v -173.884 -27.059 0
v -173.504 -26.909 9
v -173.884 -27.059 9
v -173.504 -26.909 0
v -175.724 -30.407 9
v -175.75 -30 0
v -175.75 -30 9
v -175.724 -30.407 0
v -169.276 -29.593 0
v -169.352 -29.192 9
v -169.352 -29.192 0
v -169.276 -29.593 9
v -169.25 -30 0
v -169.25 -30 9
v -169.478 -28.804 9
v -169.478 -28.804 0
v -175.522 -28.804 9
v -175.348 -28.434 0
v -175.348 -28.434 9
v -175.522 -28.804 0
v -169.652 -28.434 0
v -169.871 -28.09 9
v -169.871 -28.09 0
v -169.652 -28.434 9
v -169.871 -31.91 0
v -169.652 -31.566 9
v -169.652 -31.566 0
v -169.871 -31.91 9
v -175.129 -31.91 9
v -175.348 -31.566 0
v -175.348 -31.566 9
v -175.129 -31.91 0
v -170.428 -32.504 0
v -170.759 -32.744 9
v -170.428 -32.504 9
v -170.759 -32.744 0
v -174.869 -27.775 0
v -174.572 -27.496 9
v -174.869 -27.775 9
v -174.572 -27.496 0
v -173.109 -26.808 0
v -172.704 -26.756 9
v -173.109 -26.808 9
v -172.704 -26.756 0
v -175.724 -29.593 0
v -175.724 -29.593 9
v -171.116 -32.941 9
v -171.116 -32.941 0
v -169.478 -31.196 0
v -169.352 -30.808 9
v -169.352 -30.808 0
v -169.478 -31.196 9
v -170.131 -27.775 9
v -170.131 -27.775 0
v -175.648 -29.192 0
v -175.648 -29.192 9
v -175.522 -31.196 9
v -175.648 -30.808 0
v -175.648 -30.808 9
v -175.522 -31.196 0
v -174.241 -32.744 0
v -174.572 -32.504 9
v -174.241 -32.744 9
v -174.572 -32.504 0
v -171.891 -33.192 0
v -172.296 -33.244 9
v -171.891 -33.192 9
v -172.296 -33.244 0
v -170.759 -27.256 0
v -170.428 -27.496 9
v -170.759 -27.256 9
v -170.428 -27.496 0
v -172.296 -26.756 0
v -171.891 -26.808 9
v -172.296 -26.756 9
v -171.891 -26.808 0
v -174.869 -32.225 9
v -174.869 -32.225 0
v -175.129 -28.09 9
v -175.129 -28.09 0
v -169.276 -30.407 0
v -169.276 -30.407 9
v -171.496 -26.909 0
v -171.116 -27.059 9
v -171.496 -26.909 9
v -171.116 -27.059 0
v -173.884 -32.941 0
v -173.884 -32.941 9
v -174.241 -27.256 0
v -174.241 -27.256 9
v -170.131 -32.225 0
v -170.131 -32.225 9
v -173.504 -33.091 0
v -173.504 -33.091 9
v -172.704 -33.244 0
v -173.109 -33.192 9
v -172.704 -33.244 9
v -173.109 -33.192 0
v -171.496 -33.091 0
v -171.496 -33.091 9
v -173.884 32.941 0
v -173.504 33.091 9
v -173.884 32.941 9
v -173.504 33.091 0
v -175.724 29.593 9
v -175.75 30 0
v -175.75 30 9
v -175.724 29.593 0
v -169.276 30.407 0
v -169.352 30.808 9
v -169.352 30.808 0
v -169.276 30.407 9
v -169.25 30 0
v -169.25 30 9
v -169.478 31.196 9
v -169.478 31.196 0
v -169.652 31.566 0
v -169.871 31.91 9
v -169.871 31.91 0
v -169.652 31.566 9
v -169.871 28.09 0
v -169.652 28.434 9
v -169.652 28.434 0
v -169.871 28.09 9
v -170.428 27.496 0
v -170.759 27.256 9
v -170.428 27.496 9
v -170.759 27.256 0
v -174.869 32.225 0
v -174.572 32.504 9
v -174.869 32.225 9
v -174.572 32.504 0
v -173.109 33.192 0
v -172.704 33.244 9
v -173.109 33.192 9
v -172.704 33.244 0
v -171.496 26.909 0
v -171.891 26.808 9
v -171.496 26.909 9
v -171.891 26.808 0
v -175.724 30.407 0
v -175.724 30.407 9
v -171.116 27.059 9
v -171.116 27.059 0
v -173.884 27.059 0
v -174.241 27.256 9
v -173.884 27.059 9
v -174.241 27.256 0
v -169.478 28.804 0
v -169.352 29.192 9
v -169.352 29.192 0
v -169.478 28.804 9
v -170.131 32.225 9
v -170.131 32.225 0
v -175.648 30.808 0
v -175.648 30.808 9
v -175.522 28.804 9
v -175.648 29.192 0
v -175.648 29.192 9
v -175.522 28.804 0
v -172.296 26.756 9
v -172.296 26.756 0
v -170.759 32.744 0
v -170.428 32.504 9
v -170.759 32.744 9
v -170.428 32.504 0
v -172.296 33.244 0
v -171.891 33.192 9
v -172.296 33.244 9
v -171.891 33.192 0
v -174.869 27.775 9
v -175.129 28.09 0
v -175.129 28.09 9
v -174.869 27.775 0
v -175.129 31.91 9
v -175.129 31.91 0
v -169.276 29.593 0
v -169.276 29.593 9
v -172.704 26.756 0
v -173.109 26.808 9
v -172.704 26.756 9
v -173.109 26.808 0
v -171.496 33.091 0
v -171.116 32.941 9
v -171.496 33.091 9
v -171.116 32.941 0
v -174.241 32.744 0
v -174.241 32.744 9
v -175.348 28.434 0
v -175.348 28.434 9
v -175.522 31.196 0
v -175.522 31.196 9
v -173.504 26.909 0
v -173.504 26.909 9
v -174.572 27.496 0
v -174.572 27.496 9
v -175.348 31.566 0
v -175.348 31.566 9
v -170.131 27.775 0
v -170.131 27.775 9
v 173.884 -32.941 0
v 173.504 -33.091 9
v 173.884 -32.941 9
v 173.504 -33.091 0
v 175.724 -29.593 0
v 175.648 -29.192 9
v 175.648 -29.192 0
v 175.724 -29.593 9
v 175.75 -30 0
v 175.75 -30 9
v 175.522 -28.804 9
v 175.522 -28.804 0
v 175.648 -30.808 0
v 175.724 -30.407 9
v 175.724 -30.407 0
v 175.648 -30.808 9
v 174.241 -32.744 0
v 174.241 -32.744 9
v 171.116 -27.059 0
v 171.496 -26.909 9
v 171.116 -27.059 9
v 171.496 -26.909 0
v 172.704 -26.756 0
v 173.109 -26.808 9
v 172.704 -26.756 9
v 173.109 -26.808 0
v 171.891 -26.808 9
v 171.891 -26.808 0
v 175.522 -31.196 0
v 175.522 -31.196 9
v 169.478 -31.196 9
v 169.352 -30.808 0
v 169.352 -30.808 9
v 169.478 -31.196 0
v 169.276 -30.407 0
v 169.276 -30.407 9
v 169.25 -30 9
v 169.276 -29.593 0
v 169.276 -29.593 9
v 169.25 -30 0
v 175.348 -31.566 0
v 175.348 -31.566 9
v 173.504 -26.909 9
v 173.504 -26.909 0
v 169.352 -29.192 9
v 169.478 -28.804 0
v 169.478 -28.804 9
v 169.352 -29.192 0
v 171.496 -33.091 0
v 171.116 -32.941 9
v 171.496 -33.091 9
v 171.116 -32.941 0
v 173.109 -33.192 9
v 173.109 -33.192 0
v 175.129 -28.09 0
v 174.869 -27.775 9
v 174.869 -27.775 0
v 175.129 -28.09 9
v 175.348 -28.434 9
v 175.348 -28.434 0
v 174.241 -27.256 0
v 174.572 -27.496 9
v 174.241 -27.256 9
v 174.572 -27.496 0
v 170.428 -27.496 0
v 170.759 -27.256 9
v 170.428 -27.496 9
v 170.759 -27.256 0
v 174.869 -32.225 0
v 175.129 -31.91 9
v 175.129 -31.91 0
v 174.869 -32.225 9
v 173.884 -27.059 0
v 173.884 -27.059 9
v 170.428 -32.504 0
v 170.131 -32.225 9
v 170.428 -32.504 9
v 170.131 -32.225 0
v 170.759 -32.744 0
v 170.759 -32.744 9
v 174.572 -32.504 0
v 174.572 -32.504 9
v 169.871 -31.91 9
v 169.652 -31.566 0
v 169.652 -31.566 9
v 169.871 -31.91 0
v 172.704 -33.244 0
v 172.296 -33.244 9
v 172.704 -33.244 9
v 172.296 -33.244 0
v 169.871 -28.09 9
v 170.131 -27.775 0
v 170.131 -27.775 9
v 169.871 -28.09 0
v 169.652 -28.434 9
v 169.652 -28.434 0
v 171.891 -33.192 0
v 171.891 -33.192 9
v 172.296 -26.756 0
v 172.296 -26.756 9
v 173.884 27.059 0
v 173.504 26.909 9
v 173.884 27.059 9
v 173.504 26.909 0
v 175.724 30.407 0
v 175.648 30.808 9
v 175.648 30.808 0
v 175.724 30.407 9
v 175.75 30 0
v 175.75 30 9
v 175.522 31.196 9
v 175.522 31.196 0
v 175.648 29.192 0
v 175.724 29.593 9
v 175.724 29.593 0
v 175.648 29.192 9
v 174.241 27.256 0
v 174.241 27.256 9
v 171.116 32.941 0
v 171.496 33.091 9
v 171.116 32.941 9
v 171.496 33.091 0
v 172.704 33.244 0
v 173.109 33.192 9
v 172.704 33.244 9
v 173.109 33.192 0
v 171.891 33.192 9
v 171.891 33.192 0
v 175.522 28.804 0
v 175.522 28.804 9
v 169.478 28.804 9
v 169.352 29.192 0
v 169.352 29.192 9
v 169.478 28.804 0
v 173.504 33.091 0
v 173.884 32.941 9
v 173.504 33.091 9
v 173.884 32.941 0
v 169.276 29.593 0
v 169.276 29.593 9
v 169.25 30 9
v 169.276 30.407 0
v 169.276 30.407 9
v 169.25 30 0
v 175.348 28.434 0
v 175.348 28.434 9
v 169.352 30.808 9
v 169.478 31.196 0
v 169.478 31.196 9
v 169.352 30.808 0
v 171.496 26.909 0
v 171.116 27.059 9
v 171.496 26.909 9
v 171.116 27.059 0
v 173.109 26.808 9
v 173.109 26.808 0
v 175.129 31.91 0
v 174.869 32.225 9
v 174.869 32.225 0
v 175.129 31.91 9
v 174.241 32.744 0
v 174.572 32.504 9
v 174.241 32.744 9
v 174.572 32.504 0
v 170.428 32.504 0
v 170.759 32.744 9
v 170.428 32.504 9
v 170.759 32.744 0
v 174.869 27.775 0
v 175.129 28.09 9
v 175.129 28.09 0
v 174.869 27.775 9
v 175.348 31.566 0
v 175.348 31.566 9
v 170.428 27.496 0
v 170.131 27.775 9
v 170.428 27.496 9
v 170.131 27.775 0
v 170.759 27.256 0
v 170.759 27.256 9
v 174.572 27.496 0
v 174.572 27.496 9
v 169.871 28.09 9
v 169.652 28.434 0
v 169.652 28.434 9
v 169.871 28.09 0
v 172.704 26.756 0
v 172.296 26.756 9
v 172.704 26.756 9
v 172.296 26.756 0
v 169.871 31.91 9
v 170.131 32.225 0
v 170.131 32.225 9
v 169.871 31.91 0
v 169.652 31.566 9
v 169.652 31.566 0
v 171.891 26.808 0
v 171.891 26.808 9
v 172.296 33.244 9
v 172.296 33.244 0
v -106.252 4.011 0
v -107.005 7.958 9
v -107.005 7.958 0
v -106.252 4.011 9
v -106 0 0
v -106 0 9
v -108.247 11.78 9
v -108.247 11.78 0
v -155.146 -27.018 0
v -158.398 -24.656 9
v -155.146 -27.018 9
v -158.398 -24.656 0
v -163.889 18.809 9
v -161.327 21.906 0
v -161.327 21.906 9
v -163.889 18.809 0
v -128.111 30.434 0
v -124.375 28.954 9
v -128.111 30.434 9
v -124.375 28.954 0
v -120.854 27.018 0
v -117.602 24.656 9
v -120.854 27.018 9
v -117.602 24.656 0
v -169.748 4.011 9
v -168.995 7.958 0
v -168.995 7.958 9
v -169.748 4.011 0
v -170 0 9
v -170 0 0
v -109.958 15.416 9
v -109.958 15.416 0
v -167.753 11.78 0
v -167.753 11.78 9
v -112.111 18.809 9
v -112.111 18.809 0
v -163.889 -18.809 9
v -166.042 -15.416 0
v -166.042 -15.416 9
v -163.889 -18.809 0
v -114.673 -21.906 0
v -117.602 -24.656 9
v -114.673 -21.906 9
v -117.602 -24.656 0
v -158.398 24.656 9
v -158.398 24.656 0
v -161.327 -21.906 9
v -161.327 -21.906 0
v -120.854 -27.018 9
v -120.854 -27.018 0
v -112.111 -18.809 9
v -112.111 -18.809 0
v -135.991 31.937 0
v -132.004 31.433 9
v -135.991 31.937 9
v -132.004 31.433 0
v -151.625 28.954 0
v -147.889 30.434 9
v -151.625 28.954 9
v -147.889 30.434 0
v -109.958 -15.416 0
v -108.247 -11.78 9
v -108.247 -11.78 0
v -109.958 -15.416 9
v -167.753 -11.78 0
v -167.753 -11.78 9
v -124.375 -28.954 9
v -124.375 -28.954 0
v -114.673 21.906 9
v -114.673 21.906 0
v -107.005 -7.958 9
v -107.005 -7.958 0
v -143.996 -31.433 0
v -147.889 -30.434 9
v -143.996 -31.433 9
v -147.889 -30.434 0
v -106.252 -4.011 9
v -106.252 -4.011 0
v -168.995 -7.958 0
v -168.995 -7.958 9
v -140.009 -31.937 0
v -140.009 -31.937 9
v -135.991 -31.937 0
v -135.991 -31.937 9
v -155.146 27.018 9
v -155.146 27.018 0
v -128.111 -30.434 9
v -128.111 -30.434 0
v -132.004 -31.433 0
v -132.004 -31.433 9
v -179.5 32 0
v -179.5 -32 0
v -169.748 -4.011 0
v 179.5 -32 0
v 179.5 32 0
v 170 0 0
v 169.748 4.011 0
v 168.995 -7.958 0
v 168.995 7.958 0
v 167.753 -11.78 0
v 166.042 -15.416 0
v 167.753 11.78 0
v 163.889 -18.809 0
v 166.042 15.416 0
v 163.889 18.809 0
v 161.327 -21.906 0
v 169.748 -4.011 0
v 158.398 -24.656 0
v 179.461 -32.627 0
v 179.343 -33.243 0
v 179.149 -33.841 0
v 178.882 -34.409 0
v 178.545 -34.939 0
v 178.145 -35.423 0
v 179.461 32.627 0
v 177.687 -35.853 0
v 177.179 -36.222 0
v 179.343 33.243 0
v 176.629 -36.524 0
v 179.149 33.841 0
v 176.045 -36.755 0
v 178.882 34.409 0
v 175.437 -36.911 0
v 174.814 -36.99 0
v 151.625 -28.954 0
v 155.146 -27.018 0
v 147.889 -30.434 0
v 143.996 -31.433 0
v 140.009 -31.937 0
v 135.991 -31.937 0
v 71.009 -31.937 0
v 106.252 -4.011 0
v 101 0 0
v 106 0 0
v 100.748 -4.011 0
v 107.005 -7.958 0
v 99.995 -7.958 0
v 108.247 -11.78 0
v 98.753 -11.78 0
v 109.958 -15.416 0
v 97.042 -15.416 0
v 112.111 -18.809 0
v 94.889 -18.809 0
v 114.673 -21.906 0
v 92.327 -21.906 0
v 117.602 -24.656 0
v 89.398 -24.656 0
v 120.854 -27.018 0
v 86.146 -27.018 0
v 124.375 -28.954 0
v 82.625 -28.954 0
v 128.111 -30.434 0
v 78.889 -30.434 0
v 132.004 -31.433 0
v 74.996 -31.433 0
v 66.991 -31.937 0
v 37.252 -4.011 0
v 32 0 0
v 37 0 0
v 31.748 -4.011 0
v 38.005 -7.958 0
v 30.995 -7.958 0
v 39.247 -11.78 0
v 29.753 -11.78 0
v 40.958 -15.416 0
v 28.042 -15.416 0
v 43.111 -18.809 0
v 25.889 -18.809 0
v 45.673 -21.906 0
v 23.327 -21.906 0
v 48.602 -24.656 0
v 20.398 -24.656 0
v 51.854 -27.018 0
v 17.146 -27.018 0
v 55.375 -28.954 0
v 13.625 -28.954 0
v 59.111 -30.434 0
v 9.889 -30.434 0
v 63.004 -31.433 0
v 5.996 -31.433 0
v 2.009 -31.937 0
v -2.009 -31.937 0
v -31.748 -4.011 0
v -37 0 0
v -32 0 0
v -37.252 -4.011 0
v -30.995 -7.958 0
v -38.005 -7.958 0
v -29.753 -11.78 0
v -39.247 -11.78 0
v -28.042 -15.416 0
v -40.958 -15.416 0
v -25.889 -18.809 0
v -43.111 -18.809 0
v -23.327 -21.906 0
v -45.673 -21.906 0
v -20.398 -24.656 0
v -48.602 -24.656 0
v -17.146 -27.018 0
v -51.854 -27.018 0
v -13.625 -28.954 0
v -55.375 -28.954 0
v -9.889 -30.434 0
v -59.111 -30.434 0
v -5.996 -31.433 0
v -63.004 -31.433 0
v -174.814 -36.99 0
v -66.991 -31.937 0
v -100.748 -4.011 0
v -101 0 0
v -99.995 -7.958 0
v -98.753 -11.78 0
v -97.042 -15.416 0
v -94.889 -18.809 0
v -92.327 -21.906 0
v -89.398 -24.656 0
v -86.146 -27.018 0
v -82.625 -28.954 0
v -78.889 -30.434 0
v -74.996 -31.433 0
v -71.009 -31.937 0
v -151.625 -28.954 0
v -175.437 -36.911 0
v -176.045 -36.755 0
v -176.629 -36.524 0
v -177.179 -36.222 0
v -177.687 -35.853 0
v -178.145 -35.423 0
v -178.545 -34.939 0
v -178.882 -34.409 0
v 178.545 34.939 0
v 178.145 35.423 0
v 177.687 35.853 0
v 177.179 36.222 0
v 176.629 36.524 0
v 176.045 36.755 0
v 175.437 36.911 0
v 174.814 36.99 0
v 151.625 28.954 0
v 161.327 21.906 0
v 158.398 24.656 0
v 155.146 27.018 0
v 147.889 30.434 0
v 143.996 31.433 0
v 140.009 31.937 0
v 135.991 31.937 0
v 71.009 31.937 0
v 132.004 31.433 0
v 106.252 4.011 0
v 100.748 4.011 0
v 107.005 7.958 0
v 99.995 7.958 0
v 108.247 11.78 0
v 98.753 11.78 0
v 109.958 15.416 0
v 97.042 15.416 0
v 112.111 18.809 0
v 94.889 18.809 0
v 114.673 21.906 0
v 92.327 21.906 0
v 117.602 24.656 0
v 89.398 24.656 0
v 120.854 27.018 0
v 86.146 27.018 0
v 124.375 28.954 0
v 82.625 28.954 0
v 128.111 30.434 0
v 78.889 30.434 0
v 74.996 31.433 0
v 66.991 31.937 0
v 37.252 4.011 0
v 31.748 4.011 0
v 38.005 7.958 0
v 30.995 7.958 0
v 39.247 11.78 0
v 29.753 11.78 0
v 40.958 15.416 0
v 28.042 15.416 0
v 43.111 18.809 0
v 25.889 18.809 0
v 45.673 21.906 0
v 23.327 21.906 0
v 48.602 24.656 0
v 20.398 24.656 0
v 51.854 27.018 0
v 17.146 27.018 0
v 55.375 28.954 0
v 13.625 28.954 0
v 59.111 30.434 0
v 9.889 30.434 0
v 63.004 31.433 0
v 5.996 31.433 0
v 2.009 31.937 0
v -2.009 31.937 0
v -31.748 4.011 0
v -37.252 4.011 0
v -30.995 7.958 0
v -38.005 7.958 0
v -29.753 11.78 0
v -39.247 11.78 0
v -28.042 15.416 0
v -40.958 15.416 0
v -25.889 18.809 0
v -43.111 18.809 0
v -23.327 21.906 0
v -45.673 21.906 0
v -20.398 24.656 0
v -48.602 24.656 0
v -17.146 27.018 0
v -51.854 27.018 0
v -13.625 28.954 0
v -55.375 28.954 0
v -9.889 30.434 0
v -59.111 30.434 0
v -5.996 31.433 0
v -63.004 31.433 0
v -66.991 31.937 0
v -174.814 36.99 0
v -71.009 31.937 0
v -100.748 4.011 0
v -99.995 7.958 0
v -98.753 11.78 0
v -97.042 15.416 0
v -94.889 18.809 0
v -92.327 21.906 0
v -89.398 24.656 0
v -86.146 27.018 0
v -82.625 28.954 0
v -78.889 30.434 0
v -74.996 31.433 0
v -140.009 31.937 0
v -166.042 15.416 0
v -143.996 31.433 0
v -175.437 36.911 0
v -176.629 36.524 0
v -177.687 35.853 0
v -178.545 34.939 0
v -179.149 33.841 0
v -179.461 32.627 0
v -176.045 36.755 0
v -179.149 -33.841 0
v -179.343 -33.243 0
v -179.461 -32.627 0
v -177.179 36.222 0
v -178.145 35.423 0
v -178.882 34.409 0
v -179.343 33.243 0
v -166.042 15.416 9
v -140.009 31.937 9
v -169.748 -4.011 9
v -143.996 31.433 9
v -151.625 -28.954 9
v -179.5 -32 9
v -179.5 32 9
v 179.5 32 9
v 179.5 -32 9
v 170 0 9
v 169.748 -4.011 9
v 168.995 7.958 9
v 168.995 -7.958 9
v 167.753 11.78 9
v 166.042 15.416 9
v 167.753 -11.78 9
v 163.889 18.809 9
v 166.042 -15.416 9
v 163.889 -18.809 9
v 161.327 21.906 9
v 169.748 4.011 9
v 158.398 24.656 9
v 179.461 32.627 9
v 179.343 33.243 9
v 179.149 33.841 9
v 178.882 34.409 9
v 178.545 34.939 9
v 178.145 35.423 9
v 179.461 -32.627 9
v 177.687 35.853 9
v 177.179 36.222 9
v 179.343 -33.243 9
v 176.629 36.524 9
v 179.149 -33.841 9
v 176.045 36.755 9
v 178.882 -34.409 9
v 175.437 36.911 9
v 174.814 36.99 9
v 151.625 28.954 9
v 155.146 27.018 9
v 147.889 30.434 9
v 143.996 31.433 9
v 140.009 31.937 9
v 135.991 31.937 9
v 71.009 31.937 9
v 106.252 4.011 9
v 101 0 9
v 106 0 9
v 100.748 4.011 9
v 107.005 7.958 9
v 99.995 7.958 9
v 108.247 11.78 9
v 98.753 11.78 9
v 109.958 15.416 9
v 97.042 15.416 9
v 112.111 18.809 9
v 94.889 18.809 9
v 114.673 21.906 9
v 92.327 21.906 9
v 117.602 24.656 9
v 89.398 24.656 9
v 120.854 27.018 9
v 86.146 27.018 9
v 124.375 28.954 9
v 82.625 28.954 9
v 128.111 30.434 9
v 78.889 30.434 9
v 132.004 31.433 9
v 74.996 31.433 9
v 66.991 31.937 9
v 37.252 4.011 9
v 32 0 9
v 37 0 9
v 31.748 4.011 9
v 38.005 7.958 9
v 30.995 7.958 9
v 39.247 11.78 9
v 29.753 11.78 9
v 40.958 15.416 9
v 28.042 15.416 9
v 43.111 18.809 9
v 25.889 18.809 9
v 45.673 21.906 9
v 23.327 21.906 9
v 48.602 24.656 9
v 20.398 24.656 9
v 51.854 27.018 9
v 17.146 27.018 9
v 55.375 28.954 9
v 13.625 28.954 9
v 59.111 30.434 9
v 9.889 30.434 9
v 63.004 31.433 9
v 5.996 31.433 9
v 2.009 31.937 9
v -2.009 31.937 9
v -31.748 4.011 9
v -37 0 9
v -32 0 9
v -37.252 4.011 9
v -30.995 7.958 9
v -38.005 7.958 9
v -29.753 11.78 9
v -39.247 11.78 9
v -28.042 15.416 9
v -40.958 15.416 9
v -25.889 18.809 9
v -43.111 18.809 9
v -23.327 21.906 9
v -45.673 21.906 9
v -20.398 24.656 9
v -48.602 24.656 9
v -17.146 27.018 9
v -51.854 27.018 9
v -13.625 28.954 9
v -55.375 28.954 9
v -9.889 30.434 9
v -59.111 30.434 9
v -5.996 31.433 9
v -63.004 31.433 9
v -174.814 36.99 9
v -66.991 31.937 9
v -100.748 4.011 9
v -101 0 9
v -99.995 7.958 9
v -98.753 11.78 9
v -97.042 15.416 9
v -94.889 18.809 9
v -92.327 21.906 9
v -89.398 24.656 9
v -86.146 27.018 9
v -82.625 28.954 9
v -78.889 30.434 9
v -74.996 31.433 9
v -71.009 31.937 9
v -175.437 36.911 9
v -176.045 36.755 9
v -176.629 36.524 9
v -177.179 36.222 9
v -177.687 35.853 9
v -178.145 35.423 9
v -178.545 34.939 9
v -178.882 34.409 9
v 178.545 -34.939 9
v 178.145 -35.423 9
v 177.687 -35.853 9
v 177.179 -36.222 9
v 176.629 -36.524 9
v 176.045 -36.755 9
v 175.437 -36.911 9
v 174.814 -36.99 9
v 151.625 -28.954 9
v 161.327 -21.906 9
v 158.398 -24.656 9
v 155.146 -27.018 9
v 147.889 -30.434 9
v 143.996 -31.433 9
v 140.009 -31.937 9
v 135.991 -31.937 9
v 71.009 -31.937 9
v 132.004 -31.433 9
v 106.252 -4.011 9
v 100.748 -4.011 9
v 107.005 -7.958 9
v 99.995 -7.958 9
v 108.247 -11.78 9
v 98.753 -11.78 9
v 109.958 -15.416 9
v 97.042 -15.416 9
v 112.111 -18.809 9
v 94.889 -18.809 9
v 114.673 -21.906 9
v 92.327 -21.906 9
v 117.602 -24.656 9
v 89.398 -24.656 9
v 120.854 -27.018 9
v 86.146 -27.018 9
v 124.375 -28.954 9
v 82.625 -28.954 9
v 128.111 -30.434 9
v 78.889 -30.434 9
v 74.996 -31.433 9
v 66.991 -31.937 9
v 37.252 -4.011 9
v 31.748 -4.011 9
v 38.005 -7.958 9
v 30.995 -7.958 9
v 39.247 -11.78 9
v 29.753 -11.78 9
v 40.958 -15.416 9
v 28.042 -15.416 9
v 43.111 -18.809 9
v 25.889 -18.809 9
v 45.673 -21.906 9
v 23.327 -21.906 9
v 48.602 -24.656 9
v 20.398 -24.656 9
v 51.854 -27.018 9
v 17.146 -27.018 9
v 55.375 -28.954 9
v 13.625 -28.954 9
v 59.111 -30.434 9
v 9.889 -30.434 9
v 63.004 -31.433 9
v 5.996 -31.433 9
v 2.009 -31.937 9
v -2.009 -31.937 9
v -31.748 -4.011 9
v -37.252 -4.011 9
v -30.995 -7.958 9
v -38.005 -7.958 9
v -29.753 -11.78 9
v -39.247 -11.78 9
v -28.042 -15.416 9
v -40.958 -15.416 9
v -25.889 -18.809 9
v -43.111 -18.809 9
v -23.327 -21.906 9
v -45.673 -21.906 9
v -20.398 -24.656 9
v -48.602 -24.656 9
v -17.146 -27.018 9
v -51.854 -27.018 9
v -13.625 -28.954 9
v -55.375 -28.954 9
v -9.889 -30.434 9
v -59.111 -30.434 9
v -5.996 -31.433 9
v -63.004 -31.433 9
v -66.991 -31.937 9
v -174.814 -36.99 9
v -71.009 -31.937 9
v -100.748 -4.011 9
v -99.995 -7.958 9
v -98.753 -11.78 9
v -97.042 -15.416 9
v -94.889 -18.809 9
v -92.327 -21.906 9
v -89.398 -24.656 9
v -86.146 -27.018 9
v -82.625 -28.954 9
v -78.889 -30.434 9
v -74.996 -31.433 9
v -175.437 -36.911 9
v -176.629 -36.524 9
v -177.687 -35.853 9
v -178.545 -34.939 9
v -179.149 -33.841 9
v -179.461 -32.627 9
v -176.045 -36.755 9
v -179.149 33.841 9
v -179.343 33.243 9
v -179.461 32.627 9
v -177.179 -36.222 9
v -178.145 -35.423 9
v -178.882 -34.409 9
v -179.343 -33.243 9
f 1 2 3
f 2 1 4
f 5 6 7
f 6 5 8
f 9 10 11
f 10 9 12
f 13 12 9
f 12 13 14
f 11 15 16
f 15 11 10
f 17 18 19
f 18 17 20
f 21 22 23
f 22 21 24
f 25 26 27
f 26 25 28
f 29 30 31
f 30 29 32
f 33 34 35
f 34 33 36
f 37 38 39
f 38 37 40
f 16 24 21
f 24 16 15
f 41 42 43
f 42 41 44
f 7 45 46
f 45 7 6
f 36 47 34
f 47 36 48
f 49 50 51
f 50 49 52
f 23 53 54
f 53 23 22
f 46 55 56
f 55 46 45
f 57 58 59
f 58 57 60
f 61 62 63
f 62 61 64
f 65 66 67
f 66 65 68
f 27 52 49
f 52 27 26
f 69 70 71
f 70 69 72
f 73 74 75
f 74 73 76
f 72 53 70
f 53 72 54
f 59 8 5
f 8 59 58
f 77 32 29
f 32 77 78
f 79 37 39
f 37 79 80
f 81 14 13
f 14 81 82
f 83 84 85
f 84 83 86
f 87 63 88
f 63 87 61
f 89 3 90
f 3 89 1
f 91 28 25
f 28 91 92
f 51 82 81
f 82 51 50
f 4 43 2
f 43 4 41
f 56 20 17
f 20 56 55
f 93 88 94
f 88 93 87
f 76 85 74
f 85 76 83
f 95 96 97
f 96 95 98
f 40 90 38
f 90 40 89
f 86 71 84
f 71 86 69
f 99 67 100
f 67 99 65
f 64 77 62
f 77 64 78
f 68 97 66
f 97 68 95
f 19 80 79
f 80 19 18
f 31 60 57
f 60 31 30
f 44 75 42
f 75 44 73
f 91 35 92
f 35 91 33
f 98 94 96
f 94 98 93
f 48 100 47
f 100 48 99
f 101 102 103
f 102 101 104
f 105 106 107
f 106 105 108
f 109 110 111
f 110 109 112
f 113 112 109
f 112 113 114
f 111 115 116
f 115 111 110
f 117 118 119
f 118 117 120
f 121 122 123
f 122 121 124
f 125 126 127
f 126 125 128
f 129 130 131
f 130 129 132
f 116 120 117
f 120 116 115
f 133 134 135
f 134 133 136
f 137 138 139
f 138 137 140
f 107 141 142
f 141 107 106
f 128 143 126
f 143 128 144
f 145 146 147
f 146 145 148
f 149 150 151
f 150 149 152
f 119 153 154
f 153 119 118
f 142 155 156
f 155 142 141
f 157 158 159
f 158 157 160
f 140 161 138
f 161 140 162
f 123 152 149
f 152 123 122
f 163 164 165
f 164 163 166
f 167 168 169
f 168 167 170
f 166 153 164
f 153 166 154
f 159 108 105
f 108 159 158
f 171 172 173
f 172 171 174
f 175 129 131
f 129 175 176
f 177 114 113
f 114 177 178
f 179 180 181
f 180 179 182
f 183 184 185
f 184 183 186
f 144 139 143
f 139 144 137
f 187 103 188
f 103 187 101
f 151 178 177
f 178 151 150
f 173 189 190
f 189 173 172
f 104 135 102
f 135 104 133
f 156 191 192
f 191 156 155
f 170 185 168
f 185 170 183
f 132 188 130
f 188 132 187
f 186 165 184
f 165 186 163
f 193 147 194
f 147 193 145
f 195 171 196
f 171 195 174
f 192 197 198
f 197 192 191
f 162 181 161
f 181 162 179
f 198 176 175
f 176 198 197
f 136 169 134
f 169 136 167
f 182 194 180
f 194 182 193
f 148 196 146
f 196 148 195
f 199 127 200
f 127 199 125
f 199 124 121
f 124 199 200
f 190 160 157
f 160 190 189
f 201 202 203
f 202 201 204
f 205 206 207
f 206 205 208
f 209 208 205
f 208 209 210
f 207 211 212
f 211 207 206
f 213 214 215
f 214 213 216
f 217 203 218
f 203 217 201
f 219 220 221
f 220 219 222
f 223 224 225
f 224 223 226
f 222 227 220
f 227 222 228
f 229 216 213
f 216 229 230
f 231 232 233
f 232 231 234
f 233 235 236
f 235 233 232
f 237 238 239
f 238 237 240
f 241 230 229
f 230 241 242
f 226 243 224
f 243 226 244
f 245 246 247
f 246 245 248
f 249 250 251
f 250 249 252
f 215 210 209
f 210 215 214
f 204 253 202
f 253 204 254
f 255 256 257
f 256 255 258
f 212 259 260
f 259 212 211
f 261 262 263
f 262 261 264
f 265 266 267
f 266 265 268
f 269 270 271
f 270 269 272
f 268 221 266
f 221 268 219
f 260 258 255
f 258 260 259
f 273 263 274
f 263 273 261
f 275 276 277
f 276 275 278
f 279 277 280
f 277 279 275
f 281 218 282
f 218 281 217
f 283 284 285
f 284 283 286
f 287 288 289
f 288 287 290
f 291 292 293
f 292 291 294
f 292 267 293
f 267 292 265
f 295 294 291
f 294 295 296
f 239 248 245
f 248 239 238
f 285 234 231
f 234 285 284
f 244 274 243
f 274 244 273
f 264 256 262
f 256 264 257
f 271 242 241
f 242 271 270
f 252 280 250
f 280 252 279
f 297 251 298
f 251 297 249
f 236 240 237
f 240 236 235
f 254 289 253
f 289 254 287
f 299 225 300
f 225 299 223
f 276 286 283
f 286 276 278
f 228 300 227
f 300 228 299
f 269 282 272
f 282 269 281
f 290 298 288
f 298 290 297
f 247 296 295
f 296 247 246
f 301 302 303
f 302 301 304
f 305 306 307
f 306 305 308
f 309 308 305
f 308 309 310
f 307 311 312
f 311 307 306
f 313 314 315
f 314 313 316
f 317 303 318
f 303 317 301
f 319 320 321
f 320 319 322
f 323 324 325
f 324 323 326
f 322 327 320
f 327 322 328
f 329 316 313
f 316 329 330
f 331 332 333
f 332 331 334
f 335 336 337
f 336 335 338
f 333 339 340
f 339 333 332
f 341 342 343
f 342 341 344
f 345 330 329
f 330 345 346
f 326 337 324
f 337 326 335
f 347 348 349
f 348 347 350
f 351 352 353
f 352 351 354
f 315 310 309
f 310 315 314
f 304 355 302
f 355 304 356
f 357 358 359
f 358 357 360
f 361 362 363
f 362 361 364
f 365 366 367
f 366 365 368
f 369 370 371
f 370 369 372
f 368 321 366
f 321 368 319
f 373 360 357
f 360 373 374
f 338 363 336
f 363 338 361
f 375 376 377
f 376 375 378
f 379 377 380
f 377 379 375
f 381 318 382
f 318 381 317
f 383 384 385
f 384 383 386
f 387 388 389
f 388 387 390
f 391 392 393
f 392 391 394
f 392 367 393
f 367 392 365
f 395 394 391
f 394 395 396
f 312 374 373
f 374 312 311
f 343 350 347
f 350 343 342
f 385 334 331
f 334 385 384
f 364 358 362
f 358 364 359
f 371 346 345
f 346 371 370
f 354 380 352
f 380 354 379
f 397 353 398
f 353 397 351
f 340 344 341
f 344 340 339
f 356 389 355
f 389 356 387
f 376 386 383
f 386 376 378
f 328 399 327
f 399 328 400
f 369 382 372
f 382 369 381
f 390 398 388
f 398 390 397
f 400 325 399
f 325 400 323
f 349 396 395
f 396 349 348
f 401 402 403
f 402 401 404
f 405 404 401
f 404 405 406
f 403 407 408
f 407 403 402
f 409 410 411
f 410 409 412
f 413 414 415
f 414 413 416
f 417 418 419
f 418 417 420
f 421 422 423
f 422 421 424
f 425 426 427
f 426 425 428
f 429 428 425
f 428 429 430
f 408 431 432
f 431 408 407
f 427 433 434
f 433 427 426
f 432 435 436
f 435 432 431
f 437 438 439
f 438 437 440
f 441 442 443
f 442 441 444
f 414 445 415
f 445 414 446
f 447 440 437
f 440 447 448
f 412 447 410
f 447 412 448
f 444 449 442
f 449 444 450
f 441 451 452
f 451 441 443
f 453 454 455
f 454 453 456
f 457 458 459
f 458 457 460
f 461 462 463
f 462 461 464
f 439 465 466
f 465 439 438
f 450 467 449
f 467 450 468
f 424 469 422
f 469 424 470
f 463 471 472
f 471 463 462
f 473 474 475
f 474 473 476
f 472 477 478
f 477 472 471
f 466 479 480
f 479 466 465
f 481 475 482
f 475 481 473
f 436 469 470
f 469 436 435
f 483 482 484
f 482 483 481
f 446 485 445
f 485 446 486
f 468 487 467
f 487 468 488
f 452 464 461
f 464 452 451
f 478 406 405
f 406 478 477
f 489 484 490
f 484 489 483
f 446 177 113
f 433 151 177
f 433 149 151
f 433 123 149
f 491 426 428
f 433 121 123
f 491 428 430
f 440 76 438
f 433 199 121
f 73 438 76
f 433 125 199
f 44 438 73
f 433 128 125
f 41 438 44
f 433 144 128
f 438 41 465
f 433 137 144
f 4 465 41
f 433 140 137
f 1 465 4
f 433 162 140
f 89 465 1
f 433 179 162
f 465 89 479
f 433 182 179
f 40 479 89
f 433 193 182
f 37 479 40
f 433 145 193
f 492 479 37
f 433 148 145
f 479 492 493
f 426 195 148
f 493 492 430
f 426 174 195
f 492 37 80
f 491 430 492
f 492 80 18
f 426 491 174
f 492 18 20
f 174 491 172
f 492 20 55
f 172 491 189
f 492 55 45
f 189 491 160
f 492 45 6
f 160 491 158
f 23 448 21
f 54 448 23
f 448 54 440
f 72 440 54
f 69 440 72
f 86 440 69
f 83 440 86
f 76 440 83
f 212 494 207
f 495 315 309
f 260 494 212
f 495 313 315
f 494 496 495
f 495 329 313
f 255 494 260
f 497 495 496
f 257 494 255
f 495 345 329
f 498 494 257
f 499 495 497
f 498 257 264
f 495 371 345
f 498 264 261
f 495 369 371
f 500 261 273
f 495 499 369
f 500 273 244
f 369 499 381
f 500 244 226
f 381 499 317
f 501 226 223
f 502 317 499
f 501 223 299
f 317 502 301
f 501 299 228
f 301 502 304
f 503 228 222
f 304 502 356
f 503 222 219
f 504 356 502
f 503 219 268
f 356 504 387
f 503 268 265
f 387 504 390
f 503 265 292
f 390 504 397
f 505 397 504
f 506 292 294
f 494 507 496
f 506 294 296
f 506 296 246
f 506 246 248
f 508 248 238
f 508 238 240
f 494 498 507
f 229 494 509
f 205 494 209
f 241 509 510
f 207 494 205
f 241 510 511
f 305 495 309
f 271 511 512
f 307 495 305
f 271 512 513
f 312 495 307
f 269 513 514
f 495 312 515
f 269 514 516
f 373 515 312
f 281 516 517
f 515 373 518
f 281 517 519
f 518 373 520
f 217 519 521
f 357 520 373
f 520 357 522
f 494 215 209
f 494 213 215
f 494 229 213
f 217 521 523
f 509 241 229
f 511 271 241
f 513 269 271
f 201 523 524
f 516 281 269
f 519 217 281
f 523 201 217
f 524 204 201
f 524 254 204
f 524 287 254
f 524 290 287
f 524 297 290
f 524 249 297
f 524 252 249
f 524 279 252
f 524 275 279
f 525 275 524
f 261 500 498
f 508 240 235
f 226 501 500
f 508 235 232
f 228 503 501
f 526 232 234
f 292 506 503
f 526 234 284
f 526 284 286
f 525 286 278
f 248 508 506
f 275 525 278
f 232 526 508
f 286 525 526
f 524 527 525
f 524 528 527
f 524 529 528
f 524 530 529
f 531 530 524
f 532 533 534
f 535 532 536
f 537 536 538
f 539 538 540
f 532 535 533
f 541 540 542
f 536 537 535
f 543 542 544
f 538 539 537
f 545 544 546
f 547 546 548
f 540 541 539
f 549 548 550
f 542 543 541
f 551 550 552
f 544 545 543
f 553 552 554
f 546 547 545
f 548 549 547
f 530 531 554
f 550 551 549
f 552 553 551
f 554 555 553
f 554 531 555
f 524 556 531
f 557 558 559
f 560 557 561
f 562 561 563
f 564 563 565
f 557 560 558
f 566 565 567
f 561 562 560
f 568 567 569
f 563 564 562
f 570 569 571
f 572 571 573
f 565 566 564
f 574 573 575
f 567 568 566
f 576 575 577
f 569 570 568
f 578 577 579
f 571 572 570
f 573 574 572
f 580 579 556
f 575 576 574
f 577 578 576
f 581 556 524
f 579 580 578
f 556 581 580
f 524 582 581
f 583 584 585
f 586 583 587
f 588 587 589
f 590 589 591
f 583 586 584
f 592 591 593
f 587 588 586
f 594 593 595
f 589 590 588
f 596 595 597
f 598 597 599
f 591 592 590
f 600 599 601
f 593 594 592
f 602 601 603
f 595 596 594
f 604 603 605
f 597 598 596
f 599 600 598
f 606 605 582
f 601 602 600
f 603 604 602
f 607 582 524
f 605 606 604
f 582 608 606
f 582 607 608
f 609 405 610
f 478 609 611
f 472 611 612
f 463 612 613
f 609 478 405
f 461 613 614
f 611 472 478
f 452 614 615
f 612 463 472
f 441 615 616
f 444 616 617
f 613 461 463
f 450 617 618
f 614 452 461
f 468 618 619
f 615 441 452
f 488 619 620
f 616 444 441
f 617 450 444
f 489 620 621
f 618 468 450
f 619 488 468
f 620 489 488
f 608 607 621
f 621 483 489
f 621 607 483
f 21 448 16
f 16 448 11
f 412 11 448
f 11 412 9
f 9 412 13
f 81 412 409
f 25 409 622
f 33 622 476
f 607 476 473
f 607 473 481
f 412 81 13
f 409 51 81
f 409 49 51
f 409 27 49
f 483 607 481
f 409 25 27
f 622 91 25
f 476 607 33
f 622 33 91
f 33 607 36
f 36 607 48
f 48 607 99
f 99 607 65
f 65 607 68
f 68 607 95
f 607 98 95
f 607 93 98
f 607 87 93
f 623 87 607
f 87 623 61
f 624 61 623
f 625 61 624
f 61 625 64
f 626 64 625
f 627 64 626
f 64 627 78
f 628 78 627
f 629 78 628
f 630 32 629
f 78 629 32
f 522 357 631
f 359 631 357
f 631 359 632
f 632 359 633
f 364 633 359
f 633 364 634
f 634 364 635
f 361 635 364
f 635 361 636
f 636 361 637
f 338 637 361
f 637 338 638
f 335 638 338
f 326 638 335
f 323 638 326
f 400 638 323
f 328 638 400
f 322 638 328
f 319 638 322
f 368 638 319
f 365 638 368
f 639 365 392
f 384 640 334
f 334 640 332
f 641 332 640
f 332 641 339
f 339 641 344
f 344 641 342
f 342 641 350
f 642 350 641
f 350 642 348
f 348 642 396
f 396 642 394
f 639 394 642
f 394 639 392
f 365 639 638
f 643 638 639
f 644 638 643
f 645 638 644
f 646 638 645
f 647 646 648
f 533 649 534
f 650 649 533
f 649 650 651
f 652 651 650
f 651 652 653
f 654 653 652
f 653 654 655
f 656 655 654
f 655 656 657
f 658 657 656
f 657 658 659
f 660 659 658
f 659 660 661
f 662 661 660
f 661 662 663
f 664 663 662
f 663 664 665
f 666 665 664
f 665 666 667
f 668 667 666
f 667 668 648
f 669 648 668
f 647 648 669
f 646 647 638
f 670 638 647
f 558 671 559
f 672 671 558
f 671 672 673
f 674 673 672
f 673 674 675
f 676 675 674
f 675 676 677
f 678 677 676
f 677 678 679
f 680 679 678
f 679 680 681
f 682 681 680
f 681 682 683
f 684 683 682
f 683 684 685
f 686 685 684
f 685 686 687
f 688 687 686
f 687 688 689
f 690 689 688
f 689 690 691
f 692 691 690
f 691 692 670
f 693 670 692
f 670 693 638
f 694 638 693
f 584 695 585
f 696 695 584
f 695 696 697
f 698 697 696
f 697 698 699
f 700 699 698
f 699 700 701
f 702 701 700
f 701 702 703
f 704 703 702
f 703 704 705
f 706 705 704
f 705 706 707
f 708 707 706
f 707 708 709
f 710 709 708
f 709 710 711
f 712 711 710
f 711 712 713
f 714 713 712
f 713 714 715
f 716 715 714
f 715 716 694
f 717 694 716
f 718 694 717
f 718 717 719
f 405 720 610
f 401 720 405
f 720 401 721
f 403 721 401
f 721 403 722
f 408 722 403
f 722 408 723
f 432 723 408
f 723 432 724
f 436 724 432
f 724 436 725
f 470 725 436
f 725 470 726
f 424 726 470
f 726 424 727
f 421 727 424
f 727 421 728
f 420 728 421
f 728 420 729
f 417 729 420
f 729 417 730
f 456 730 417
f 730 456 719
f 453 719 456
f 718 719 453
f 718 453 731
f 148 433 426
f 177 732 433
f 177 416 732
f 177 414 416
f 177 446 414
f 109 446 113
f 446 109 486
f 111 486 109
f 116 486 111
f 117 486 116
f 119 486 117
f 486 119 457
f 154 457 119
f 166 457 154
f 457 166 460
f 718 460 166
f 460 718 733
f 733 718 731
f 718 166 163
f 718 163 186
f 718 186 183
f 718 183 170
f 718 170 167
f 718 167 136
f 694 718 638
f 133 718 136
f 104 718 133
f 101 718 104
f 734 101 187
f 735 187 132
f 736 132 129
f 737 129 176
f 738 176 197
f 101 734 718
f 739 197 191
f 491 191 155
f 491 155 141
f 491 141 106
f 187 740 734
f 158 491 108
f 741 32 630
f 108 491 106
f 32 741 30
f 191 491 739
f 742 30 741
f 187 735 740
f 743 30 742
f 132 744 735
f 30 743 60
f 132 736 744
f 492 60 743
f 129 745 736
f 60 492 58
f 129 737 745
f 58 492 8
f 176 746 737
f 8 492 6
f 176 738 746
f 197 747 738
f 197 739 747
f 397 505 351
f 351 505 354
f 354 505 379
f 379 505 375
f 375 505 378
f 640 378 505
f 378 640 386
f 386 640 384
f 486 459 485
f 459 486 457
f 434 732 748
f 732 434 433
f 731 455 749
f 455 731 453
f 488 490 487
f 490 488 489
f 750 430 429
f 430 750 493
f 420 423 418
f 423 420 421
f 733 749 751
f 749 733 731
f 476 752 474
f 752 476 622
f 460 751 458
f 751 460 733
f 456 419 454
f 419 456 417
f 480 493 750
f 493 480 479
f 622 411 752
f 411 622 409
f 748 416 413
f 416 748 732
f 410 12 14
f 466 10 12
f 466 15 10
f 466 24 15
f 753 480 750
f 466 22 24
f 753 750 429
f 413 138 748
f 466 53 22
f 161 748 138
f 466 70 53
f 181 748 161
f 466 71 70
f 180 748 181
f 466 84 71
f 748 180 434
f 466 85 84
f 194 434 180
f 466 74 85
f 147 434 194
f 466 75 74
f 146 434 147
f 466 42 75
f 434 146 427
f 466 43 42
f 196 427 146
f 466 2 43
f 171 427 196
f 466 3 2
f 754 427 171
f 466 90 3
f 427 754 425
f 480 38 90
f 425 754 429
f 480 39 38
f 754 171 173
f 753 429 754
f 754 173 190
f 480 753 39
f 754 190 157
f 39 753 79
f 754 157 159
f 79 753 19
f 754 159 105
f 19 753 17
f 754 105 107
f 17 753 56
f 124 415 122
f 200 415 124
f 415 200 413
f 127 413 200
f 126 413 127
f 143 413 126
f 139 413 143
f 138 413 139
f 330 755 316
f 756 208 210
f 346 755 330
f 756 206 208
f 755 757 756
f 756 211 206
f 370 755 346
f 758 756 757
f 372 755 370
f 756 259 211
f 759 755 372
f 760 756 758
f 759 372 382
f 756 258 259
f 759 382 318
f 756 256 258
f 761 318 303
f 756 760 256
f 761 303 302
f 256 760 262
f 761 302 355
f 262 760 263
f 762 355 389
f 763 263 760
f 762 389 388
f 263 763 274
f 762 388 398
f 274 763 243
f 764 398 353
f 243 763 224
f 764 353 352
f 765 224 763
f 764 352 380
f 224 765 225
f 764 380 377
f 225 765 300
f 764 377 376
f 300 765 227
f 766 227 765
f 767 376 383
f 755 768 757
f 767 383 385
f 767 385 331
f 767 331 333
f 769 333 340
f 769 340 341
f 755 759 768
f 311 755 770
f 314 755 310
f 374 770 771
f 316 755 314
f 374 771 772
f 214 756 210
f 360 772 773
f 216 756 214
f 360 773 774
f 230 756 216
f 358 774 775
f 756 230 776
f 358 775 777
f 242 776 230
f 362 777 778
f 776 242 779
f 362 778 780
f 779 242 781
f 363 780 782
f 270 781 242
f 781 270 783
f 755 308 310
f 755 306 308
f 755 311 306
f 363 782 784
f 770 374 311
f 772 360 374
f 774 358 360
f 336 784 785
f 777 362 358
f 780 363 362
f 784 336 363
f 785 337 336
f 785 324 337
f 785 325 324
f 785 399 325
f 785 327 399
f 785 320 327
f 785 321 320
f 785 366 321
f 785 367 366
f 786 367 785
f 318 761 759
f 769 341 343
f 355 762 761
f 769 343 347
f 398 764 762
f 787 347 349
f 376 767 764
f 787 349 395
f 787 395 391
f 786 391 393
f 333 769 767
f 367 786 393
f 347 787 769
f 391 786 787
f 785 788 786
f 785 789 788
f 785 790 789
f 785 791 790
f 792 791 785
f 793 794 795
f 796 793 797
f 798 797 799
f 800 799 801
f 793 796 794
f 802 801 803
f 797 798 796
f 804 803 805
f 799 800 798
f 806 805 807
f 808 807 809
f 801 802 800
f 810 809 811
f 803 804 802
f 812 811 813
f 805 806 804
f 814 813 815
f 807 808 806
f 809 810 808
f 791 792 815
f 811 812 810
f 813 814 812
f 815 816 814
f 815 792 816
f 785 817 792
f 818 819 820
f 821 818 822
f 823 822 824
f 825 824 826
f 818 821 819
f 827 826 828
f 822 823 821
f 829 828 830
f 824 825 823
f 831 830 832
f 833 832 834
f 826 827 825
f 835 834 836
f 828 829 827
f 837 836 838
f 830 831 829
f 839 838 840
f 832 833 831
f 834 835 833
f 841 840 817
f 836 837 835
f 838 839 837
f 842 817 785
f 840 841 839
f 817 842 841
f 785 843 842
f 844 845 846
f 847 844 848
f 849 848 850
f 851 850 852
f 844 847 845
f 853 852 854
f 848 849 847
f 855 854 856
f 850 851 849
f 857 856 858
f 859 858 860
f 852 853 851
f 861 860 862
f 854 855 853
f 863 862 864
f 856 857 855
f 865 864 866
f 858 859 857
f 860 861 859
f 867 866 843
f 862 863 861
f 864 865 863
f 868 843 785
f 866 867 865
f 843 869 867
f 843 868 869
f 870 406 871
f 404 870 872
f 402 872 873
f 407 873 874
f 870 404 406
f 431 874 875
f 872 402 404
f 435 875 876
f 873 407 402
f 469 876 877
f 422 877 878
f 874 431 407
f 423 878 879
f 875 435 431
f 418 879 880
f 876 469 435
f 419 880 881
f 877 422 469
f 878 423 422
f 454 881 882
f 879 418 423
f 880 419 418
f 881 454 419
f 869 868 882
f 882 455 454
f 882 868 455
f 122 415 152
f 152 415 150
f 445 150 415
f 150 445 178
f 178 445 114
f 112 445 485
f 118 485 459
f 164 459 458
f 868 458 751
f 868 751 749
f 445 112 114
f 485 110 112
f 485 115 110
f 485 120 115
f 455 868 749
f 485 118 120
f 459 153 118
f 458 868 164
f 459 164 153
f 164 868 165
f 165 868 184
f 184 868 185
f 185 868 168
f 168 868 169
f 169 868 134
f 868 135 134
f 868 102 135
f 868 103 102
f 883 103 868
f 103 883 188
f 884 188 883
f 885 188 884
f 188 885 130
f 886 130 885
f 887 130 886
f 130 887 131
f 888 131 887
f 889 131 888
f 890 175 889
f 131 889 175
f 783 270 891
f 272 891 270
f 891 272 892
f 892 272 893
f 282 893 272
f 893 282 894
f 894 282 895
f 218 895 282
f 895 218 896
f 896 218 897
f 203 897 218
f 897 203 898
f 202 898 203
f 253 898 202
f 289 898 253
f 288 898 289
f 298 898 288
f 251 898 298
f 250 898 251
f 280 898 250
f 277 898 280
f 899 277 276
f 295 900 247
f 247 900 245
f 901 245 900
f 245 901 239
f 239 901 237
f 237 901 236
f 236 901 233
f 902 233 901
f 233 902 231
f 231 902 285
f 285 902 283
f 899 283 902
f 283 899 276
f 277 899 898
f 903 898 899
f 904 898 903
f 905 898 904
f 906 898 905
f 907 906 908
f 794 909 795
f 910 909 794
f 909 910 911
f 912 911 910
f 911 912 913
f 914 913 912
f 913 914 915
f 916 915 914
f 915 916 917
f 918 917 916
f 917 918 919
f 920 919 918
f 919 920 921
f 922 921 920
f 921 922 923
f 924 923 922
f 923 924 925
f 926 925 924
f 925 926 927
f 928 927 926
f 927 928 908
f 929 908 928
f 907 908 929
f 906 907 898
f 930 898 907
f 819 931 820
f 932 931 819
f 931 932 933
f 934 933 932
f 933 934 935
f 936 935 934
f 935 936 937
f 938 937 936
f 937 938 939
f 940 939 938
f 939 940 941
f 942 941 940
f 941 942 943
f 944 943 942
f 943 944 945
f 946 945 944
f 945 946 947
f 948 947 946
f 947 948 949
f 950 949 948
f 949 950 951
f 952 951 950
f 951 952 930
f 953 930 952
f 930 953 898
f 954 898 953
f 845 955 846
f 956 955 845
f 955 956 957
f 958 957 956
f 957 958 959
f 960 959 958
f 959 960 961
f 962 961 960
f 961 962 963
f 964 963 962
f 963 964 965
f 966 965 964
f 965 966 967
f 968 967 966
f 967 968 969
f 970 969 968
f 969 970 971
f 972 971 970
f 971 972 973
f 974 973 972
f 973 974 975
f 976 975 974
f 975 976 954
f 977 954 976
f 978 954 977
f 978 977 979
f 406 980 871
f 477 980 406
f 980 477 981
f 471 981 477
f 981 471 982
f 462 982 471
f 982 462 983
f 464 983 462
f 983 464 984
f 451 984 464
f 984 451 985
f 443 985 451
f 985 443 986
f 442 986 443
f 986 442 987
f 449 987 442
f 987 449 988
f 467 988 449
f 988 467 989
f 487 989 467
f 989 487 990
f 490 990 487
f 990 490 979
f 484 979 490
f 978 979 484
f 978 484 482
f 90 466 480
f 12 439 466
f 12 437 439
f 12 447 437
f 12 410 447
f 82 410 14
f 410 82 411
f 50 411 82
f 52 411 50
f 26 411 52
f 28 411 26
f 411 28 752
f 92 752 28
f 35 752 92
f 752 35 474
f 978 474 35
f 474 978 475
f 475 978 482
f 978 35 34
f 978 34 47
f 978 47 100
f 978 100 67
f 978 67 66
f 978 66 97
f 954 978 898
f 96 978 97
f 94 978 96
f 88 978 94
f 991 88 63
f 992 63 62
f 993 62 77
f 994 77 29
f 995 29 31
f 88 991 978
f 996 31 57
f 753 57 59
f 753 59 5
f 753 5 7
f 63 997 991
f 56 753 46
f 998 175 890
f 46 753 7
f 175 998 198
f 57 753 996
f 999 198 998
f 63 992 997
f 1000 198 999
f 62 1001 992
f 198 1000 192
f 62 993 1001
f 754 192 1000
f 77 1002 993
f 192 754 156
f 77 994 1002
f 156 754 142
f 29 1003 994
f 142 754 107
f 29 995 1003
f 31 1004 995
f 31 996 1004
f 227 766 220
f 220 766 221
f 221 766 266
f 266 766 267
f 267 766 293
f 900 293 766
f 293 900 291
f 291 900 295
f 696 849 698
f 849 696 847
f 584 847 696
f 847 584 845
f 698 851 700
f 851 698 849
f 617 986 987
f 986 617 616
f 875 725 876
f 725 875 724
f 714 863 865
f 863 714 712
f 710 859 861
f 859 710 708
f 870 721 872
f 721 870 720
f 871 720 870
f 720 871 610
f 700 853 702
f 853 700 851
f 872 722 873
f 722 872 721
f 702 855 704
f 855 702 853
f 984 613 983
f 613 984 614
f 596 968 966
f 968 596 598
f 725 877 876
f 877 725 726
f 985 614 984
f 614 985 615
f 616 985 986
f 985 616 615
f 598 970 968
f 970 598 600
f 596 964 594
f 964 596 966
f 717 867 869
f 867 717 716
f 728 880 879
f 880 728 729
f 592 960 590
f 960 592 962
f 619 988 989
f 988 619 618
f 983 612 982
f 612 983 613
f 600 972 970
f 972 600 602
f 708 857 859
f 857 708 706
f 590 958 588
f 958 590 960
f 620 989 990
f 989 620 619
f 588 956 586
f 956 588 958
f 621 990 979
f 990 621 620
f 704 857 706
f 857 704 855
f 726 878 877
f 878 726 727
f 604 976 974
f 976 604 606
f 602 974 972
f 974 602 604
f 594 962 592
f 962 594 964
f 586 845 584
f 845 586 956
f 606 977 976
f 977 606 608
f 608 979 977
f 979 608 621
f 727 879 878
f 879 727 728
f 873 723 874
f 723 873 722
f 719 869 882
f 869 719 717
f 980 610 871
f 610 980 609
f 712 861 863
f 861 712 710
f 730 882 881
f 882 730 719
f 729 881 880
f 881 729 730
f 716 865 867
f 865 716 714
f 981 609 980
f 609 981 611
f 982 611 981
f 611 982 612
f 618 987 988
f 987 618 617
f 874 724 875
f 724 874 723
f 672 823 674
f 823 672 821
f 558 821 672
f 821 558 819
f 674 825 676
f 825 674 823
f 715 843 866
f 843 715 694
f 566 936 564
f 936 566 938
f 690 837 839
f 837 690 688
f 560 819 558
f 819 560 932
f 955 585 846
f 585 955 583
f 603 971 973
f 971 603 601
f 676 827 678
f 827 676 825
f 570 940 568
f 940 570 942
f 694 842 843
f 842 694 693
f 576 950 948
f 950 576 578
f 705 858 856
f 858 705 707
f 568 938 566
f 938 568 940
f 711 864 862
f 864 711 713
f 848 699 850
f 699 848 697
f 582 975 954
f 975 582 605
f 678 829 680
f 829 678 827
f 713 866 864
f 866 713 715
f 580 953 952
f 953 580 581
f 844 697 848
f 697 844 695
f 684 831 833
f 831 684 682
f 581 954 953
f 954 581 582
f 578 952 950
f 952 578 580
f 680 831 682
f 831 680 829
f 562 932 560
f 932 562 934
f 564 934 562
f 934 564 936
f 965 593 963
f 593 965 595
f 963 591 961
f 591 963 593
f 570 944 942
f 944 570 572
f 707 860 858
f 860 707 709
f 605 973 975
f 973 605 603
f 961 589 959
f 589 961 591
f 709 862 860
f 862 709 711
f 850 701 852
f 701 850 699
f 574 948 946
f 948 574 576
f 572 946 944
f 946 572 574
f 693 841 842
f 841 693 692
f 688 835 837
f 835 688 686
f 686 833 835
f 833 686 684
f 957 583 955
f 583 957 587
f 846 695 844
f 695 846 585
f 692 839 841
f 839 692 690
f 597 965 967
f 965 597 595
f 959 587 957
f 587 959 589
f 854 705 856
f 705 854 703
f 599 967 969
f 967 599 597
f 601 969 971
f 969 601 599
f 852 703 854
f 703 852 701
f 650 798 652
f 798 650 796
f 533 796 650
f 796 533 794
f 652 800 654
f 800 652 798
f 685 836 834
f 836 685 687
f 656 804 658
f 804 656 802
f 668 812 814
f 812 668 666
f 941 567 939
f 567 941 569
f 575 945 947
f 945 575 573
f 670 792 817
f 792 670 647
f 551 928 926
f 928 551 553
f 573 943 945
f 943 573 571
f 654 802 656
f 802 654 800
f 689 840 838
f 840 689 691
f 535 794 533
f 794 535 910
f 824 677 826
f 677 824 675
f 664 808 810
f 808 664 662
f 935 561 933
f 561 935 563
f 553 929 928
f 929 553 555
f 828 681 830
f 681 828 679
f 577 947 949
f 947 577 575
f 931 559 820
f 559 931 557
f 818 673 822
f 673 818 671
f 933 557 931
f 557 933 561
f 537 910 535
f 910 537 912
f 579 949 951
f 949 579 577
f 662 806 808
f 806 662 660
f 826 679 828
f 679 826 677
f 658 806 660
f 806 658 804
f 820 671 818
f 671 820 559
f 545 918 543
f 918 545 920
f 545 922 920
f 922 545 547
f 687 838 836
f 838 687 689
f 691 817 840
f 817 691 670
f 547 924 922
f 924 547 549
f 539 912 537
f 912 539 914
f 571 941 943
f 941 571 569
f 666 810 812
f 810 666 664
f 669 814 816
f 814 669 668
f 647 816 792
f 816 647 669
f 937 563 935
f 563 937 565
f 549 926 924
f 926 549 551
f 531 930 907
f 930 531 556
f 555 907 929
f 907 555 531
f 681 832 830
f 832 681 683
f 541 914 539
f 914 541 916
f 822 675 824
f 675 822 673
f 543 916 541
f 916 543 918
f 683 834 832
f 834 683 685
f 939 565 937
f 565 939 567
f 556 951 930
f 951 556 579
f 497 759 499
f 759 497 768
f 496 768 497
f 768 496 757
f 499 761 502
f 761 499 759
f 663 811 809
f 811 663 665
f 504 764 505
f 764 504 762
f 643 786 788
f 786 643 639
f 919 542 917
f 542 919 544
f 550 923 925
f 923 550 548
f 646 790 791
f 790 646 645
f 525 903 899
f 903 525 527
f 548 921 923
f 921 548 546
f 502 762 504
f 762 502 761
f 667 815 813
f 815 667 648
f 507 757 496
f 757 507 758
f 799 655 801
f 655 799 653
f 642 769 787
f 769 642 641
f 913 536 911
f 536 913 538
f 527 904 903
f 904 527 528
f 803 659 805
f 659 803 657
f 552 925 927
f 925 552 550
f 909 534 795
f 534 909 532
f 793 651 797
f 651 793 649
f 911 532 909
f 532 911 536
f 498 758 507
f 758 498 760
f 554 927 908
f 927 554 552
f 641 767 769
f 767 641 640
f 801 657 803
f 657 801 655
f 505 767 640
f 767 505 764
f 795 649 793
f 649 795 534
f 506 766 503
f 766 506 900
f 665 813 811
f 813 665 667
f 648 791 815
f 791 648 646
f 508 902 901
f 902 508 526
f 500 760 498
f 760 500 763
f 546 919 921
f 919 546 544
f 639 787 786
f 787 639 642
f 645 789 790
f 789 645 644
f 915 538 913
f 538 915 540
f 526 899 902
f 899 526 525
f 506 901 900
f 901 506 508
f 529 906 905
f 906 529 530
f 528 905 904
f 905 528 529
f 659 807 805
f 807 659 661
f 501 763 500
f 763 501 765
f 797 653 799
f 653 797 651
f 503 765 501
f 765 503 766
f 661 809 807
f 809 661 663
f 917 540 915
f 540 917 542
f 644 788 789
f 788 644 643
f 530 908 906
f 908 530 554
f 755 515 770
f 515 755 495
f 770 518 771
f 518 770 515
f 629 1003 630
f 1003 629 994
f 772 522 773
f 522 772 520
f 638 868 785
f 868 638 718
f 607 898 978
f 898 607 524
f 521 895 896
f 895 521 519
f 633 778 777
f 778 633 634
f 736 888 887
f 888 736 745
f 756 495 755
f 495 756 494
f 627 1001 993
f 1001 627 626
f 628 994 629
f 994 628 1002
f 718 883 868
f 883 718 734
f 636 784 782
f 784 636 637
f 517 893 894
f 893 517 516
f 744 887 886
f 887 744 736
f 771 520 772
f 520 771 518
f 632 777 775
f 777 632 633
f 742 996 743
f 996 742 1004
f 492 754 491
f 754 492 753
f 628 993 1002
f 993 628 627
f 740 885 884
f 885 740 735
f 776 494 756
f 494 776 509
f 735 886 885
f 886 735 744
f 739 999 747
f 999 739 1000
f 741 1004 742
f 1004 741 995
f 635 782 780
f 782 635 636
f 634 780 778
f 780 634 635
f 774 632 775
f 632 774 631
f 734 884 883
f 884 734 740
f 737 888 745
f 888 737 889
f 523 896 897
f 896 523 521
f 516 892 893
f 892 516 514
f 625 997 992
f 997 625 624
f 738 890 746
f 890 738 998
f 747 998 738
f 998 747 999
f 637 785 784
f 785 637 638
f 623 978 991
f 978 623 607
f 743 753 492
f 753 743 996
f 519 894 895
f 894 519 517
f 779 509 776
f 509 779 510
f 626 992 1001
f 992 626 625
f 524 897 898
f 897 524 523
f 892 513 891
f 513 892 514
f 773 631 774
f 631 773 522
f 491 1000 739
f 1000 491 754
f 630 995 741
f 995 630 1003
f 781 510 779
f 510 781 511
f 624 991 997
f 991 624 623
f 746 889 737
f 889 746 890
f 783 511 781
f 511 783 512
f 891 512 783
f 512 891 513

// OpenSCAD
$fn = 50;


difference() {
	union() {
		hull() {
			translate(v = [-174.5000000000, 32.0000000000, 0]) {
				cylinder(h = 9, r = 5);
			}
			translate(v = [174.5000000000, 32.0000000000, 0]) {
				cylinder(h = 9, r = 5);
			}
			translate(v = [-174.5000000000, -32.0000000000, 0]) {
				cylinder(h = 9, r = 5);
			}
			translate(v = [174.5000000000, -32.0000000000, 0]) {
				cylinder(h = 9, r = 5);
			}
		}
	}
	union() {
		#translate(v = [-172.5000000000, -30.0000000000, -100.0000000000]) {
			cylinder(h = 200, r = 3.2500000000);
		}
		#translate(v = [-172.5000000000, 30.0000000000, -100.0000000000]) {
			cylinder(h = 200, r = 3.2500000000);
		}
		#translate(v = [172.5000000000, -30.0000000000, -100.0000000000]) {
			cylinder(h = 200, r = 3.2500000000);
		}
		#translate(v = [172.5000000000, 30.0000000000, -100.0000000000]) {
			cylinder(h = 200, r = 3.2500000000);
		}
		#translate(v = [-138.0000000000, 0, 0]) {
			cylinder(h = 9, r = 32.0000000000);
		}
		#translate(v = [-69.0000000000, 0, 0]) {
			cylinder(h = 9, r = 32.0000000000);
		}
		#cylinder(h = 9, r = 32.0000000000);
		#translate(v = [69.0000000000, 0, 0]) {
			cylinder(h = 9, r = 32.0000000000);
		}
		#translate(v = [138.0000000000, 0, 0]) {
			cylinder(h = 9, r = 32.0000000000);
		}
	}
}
